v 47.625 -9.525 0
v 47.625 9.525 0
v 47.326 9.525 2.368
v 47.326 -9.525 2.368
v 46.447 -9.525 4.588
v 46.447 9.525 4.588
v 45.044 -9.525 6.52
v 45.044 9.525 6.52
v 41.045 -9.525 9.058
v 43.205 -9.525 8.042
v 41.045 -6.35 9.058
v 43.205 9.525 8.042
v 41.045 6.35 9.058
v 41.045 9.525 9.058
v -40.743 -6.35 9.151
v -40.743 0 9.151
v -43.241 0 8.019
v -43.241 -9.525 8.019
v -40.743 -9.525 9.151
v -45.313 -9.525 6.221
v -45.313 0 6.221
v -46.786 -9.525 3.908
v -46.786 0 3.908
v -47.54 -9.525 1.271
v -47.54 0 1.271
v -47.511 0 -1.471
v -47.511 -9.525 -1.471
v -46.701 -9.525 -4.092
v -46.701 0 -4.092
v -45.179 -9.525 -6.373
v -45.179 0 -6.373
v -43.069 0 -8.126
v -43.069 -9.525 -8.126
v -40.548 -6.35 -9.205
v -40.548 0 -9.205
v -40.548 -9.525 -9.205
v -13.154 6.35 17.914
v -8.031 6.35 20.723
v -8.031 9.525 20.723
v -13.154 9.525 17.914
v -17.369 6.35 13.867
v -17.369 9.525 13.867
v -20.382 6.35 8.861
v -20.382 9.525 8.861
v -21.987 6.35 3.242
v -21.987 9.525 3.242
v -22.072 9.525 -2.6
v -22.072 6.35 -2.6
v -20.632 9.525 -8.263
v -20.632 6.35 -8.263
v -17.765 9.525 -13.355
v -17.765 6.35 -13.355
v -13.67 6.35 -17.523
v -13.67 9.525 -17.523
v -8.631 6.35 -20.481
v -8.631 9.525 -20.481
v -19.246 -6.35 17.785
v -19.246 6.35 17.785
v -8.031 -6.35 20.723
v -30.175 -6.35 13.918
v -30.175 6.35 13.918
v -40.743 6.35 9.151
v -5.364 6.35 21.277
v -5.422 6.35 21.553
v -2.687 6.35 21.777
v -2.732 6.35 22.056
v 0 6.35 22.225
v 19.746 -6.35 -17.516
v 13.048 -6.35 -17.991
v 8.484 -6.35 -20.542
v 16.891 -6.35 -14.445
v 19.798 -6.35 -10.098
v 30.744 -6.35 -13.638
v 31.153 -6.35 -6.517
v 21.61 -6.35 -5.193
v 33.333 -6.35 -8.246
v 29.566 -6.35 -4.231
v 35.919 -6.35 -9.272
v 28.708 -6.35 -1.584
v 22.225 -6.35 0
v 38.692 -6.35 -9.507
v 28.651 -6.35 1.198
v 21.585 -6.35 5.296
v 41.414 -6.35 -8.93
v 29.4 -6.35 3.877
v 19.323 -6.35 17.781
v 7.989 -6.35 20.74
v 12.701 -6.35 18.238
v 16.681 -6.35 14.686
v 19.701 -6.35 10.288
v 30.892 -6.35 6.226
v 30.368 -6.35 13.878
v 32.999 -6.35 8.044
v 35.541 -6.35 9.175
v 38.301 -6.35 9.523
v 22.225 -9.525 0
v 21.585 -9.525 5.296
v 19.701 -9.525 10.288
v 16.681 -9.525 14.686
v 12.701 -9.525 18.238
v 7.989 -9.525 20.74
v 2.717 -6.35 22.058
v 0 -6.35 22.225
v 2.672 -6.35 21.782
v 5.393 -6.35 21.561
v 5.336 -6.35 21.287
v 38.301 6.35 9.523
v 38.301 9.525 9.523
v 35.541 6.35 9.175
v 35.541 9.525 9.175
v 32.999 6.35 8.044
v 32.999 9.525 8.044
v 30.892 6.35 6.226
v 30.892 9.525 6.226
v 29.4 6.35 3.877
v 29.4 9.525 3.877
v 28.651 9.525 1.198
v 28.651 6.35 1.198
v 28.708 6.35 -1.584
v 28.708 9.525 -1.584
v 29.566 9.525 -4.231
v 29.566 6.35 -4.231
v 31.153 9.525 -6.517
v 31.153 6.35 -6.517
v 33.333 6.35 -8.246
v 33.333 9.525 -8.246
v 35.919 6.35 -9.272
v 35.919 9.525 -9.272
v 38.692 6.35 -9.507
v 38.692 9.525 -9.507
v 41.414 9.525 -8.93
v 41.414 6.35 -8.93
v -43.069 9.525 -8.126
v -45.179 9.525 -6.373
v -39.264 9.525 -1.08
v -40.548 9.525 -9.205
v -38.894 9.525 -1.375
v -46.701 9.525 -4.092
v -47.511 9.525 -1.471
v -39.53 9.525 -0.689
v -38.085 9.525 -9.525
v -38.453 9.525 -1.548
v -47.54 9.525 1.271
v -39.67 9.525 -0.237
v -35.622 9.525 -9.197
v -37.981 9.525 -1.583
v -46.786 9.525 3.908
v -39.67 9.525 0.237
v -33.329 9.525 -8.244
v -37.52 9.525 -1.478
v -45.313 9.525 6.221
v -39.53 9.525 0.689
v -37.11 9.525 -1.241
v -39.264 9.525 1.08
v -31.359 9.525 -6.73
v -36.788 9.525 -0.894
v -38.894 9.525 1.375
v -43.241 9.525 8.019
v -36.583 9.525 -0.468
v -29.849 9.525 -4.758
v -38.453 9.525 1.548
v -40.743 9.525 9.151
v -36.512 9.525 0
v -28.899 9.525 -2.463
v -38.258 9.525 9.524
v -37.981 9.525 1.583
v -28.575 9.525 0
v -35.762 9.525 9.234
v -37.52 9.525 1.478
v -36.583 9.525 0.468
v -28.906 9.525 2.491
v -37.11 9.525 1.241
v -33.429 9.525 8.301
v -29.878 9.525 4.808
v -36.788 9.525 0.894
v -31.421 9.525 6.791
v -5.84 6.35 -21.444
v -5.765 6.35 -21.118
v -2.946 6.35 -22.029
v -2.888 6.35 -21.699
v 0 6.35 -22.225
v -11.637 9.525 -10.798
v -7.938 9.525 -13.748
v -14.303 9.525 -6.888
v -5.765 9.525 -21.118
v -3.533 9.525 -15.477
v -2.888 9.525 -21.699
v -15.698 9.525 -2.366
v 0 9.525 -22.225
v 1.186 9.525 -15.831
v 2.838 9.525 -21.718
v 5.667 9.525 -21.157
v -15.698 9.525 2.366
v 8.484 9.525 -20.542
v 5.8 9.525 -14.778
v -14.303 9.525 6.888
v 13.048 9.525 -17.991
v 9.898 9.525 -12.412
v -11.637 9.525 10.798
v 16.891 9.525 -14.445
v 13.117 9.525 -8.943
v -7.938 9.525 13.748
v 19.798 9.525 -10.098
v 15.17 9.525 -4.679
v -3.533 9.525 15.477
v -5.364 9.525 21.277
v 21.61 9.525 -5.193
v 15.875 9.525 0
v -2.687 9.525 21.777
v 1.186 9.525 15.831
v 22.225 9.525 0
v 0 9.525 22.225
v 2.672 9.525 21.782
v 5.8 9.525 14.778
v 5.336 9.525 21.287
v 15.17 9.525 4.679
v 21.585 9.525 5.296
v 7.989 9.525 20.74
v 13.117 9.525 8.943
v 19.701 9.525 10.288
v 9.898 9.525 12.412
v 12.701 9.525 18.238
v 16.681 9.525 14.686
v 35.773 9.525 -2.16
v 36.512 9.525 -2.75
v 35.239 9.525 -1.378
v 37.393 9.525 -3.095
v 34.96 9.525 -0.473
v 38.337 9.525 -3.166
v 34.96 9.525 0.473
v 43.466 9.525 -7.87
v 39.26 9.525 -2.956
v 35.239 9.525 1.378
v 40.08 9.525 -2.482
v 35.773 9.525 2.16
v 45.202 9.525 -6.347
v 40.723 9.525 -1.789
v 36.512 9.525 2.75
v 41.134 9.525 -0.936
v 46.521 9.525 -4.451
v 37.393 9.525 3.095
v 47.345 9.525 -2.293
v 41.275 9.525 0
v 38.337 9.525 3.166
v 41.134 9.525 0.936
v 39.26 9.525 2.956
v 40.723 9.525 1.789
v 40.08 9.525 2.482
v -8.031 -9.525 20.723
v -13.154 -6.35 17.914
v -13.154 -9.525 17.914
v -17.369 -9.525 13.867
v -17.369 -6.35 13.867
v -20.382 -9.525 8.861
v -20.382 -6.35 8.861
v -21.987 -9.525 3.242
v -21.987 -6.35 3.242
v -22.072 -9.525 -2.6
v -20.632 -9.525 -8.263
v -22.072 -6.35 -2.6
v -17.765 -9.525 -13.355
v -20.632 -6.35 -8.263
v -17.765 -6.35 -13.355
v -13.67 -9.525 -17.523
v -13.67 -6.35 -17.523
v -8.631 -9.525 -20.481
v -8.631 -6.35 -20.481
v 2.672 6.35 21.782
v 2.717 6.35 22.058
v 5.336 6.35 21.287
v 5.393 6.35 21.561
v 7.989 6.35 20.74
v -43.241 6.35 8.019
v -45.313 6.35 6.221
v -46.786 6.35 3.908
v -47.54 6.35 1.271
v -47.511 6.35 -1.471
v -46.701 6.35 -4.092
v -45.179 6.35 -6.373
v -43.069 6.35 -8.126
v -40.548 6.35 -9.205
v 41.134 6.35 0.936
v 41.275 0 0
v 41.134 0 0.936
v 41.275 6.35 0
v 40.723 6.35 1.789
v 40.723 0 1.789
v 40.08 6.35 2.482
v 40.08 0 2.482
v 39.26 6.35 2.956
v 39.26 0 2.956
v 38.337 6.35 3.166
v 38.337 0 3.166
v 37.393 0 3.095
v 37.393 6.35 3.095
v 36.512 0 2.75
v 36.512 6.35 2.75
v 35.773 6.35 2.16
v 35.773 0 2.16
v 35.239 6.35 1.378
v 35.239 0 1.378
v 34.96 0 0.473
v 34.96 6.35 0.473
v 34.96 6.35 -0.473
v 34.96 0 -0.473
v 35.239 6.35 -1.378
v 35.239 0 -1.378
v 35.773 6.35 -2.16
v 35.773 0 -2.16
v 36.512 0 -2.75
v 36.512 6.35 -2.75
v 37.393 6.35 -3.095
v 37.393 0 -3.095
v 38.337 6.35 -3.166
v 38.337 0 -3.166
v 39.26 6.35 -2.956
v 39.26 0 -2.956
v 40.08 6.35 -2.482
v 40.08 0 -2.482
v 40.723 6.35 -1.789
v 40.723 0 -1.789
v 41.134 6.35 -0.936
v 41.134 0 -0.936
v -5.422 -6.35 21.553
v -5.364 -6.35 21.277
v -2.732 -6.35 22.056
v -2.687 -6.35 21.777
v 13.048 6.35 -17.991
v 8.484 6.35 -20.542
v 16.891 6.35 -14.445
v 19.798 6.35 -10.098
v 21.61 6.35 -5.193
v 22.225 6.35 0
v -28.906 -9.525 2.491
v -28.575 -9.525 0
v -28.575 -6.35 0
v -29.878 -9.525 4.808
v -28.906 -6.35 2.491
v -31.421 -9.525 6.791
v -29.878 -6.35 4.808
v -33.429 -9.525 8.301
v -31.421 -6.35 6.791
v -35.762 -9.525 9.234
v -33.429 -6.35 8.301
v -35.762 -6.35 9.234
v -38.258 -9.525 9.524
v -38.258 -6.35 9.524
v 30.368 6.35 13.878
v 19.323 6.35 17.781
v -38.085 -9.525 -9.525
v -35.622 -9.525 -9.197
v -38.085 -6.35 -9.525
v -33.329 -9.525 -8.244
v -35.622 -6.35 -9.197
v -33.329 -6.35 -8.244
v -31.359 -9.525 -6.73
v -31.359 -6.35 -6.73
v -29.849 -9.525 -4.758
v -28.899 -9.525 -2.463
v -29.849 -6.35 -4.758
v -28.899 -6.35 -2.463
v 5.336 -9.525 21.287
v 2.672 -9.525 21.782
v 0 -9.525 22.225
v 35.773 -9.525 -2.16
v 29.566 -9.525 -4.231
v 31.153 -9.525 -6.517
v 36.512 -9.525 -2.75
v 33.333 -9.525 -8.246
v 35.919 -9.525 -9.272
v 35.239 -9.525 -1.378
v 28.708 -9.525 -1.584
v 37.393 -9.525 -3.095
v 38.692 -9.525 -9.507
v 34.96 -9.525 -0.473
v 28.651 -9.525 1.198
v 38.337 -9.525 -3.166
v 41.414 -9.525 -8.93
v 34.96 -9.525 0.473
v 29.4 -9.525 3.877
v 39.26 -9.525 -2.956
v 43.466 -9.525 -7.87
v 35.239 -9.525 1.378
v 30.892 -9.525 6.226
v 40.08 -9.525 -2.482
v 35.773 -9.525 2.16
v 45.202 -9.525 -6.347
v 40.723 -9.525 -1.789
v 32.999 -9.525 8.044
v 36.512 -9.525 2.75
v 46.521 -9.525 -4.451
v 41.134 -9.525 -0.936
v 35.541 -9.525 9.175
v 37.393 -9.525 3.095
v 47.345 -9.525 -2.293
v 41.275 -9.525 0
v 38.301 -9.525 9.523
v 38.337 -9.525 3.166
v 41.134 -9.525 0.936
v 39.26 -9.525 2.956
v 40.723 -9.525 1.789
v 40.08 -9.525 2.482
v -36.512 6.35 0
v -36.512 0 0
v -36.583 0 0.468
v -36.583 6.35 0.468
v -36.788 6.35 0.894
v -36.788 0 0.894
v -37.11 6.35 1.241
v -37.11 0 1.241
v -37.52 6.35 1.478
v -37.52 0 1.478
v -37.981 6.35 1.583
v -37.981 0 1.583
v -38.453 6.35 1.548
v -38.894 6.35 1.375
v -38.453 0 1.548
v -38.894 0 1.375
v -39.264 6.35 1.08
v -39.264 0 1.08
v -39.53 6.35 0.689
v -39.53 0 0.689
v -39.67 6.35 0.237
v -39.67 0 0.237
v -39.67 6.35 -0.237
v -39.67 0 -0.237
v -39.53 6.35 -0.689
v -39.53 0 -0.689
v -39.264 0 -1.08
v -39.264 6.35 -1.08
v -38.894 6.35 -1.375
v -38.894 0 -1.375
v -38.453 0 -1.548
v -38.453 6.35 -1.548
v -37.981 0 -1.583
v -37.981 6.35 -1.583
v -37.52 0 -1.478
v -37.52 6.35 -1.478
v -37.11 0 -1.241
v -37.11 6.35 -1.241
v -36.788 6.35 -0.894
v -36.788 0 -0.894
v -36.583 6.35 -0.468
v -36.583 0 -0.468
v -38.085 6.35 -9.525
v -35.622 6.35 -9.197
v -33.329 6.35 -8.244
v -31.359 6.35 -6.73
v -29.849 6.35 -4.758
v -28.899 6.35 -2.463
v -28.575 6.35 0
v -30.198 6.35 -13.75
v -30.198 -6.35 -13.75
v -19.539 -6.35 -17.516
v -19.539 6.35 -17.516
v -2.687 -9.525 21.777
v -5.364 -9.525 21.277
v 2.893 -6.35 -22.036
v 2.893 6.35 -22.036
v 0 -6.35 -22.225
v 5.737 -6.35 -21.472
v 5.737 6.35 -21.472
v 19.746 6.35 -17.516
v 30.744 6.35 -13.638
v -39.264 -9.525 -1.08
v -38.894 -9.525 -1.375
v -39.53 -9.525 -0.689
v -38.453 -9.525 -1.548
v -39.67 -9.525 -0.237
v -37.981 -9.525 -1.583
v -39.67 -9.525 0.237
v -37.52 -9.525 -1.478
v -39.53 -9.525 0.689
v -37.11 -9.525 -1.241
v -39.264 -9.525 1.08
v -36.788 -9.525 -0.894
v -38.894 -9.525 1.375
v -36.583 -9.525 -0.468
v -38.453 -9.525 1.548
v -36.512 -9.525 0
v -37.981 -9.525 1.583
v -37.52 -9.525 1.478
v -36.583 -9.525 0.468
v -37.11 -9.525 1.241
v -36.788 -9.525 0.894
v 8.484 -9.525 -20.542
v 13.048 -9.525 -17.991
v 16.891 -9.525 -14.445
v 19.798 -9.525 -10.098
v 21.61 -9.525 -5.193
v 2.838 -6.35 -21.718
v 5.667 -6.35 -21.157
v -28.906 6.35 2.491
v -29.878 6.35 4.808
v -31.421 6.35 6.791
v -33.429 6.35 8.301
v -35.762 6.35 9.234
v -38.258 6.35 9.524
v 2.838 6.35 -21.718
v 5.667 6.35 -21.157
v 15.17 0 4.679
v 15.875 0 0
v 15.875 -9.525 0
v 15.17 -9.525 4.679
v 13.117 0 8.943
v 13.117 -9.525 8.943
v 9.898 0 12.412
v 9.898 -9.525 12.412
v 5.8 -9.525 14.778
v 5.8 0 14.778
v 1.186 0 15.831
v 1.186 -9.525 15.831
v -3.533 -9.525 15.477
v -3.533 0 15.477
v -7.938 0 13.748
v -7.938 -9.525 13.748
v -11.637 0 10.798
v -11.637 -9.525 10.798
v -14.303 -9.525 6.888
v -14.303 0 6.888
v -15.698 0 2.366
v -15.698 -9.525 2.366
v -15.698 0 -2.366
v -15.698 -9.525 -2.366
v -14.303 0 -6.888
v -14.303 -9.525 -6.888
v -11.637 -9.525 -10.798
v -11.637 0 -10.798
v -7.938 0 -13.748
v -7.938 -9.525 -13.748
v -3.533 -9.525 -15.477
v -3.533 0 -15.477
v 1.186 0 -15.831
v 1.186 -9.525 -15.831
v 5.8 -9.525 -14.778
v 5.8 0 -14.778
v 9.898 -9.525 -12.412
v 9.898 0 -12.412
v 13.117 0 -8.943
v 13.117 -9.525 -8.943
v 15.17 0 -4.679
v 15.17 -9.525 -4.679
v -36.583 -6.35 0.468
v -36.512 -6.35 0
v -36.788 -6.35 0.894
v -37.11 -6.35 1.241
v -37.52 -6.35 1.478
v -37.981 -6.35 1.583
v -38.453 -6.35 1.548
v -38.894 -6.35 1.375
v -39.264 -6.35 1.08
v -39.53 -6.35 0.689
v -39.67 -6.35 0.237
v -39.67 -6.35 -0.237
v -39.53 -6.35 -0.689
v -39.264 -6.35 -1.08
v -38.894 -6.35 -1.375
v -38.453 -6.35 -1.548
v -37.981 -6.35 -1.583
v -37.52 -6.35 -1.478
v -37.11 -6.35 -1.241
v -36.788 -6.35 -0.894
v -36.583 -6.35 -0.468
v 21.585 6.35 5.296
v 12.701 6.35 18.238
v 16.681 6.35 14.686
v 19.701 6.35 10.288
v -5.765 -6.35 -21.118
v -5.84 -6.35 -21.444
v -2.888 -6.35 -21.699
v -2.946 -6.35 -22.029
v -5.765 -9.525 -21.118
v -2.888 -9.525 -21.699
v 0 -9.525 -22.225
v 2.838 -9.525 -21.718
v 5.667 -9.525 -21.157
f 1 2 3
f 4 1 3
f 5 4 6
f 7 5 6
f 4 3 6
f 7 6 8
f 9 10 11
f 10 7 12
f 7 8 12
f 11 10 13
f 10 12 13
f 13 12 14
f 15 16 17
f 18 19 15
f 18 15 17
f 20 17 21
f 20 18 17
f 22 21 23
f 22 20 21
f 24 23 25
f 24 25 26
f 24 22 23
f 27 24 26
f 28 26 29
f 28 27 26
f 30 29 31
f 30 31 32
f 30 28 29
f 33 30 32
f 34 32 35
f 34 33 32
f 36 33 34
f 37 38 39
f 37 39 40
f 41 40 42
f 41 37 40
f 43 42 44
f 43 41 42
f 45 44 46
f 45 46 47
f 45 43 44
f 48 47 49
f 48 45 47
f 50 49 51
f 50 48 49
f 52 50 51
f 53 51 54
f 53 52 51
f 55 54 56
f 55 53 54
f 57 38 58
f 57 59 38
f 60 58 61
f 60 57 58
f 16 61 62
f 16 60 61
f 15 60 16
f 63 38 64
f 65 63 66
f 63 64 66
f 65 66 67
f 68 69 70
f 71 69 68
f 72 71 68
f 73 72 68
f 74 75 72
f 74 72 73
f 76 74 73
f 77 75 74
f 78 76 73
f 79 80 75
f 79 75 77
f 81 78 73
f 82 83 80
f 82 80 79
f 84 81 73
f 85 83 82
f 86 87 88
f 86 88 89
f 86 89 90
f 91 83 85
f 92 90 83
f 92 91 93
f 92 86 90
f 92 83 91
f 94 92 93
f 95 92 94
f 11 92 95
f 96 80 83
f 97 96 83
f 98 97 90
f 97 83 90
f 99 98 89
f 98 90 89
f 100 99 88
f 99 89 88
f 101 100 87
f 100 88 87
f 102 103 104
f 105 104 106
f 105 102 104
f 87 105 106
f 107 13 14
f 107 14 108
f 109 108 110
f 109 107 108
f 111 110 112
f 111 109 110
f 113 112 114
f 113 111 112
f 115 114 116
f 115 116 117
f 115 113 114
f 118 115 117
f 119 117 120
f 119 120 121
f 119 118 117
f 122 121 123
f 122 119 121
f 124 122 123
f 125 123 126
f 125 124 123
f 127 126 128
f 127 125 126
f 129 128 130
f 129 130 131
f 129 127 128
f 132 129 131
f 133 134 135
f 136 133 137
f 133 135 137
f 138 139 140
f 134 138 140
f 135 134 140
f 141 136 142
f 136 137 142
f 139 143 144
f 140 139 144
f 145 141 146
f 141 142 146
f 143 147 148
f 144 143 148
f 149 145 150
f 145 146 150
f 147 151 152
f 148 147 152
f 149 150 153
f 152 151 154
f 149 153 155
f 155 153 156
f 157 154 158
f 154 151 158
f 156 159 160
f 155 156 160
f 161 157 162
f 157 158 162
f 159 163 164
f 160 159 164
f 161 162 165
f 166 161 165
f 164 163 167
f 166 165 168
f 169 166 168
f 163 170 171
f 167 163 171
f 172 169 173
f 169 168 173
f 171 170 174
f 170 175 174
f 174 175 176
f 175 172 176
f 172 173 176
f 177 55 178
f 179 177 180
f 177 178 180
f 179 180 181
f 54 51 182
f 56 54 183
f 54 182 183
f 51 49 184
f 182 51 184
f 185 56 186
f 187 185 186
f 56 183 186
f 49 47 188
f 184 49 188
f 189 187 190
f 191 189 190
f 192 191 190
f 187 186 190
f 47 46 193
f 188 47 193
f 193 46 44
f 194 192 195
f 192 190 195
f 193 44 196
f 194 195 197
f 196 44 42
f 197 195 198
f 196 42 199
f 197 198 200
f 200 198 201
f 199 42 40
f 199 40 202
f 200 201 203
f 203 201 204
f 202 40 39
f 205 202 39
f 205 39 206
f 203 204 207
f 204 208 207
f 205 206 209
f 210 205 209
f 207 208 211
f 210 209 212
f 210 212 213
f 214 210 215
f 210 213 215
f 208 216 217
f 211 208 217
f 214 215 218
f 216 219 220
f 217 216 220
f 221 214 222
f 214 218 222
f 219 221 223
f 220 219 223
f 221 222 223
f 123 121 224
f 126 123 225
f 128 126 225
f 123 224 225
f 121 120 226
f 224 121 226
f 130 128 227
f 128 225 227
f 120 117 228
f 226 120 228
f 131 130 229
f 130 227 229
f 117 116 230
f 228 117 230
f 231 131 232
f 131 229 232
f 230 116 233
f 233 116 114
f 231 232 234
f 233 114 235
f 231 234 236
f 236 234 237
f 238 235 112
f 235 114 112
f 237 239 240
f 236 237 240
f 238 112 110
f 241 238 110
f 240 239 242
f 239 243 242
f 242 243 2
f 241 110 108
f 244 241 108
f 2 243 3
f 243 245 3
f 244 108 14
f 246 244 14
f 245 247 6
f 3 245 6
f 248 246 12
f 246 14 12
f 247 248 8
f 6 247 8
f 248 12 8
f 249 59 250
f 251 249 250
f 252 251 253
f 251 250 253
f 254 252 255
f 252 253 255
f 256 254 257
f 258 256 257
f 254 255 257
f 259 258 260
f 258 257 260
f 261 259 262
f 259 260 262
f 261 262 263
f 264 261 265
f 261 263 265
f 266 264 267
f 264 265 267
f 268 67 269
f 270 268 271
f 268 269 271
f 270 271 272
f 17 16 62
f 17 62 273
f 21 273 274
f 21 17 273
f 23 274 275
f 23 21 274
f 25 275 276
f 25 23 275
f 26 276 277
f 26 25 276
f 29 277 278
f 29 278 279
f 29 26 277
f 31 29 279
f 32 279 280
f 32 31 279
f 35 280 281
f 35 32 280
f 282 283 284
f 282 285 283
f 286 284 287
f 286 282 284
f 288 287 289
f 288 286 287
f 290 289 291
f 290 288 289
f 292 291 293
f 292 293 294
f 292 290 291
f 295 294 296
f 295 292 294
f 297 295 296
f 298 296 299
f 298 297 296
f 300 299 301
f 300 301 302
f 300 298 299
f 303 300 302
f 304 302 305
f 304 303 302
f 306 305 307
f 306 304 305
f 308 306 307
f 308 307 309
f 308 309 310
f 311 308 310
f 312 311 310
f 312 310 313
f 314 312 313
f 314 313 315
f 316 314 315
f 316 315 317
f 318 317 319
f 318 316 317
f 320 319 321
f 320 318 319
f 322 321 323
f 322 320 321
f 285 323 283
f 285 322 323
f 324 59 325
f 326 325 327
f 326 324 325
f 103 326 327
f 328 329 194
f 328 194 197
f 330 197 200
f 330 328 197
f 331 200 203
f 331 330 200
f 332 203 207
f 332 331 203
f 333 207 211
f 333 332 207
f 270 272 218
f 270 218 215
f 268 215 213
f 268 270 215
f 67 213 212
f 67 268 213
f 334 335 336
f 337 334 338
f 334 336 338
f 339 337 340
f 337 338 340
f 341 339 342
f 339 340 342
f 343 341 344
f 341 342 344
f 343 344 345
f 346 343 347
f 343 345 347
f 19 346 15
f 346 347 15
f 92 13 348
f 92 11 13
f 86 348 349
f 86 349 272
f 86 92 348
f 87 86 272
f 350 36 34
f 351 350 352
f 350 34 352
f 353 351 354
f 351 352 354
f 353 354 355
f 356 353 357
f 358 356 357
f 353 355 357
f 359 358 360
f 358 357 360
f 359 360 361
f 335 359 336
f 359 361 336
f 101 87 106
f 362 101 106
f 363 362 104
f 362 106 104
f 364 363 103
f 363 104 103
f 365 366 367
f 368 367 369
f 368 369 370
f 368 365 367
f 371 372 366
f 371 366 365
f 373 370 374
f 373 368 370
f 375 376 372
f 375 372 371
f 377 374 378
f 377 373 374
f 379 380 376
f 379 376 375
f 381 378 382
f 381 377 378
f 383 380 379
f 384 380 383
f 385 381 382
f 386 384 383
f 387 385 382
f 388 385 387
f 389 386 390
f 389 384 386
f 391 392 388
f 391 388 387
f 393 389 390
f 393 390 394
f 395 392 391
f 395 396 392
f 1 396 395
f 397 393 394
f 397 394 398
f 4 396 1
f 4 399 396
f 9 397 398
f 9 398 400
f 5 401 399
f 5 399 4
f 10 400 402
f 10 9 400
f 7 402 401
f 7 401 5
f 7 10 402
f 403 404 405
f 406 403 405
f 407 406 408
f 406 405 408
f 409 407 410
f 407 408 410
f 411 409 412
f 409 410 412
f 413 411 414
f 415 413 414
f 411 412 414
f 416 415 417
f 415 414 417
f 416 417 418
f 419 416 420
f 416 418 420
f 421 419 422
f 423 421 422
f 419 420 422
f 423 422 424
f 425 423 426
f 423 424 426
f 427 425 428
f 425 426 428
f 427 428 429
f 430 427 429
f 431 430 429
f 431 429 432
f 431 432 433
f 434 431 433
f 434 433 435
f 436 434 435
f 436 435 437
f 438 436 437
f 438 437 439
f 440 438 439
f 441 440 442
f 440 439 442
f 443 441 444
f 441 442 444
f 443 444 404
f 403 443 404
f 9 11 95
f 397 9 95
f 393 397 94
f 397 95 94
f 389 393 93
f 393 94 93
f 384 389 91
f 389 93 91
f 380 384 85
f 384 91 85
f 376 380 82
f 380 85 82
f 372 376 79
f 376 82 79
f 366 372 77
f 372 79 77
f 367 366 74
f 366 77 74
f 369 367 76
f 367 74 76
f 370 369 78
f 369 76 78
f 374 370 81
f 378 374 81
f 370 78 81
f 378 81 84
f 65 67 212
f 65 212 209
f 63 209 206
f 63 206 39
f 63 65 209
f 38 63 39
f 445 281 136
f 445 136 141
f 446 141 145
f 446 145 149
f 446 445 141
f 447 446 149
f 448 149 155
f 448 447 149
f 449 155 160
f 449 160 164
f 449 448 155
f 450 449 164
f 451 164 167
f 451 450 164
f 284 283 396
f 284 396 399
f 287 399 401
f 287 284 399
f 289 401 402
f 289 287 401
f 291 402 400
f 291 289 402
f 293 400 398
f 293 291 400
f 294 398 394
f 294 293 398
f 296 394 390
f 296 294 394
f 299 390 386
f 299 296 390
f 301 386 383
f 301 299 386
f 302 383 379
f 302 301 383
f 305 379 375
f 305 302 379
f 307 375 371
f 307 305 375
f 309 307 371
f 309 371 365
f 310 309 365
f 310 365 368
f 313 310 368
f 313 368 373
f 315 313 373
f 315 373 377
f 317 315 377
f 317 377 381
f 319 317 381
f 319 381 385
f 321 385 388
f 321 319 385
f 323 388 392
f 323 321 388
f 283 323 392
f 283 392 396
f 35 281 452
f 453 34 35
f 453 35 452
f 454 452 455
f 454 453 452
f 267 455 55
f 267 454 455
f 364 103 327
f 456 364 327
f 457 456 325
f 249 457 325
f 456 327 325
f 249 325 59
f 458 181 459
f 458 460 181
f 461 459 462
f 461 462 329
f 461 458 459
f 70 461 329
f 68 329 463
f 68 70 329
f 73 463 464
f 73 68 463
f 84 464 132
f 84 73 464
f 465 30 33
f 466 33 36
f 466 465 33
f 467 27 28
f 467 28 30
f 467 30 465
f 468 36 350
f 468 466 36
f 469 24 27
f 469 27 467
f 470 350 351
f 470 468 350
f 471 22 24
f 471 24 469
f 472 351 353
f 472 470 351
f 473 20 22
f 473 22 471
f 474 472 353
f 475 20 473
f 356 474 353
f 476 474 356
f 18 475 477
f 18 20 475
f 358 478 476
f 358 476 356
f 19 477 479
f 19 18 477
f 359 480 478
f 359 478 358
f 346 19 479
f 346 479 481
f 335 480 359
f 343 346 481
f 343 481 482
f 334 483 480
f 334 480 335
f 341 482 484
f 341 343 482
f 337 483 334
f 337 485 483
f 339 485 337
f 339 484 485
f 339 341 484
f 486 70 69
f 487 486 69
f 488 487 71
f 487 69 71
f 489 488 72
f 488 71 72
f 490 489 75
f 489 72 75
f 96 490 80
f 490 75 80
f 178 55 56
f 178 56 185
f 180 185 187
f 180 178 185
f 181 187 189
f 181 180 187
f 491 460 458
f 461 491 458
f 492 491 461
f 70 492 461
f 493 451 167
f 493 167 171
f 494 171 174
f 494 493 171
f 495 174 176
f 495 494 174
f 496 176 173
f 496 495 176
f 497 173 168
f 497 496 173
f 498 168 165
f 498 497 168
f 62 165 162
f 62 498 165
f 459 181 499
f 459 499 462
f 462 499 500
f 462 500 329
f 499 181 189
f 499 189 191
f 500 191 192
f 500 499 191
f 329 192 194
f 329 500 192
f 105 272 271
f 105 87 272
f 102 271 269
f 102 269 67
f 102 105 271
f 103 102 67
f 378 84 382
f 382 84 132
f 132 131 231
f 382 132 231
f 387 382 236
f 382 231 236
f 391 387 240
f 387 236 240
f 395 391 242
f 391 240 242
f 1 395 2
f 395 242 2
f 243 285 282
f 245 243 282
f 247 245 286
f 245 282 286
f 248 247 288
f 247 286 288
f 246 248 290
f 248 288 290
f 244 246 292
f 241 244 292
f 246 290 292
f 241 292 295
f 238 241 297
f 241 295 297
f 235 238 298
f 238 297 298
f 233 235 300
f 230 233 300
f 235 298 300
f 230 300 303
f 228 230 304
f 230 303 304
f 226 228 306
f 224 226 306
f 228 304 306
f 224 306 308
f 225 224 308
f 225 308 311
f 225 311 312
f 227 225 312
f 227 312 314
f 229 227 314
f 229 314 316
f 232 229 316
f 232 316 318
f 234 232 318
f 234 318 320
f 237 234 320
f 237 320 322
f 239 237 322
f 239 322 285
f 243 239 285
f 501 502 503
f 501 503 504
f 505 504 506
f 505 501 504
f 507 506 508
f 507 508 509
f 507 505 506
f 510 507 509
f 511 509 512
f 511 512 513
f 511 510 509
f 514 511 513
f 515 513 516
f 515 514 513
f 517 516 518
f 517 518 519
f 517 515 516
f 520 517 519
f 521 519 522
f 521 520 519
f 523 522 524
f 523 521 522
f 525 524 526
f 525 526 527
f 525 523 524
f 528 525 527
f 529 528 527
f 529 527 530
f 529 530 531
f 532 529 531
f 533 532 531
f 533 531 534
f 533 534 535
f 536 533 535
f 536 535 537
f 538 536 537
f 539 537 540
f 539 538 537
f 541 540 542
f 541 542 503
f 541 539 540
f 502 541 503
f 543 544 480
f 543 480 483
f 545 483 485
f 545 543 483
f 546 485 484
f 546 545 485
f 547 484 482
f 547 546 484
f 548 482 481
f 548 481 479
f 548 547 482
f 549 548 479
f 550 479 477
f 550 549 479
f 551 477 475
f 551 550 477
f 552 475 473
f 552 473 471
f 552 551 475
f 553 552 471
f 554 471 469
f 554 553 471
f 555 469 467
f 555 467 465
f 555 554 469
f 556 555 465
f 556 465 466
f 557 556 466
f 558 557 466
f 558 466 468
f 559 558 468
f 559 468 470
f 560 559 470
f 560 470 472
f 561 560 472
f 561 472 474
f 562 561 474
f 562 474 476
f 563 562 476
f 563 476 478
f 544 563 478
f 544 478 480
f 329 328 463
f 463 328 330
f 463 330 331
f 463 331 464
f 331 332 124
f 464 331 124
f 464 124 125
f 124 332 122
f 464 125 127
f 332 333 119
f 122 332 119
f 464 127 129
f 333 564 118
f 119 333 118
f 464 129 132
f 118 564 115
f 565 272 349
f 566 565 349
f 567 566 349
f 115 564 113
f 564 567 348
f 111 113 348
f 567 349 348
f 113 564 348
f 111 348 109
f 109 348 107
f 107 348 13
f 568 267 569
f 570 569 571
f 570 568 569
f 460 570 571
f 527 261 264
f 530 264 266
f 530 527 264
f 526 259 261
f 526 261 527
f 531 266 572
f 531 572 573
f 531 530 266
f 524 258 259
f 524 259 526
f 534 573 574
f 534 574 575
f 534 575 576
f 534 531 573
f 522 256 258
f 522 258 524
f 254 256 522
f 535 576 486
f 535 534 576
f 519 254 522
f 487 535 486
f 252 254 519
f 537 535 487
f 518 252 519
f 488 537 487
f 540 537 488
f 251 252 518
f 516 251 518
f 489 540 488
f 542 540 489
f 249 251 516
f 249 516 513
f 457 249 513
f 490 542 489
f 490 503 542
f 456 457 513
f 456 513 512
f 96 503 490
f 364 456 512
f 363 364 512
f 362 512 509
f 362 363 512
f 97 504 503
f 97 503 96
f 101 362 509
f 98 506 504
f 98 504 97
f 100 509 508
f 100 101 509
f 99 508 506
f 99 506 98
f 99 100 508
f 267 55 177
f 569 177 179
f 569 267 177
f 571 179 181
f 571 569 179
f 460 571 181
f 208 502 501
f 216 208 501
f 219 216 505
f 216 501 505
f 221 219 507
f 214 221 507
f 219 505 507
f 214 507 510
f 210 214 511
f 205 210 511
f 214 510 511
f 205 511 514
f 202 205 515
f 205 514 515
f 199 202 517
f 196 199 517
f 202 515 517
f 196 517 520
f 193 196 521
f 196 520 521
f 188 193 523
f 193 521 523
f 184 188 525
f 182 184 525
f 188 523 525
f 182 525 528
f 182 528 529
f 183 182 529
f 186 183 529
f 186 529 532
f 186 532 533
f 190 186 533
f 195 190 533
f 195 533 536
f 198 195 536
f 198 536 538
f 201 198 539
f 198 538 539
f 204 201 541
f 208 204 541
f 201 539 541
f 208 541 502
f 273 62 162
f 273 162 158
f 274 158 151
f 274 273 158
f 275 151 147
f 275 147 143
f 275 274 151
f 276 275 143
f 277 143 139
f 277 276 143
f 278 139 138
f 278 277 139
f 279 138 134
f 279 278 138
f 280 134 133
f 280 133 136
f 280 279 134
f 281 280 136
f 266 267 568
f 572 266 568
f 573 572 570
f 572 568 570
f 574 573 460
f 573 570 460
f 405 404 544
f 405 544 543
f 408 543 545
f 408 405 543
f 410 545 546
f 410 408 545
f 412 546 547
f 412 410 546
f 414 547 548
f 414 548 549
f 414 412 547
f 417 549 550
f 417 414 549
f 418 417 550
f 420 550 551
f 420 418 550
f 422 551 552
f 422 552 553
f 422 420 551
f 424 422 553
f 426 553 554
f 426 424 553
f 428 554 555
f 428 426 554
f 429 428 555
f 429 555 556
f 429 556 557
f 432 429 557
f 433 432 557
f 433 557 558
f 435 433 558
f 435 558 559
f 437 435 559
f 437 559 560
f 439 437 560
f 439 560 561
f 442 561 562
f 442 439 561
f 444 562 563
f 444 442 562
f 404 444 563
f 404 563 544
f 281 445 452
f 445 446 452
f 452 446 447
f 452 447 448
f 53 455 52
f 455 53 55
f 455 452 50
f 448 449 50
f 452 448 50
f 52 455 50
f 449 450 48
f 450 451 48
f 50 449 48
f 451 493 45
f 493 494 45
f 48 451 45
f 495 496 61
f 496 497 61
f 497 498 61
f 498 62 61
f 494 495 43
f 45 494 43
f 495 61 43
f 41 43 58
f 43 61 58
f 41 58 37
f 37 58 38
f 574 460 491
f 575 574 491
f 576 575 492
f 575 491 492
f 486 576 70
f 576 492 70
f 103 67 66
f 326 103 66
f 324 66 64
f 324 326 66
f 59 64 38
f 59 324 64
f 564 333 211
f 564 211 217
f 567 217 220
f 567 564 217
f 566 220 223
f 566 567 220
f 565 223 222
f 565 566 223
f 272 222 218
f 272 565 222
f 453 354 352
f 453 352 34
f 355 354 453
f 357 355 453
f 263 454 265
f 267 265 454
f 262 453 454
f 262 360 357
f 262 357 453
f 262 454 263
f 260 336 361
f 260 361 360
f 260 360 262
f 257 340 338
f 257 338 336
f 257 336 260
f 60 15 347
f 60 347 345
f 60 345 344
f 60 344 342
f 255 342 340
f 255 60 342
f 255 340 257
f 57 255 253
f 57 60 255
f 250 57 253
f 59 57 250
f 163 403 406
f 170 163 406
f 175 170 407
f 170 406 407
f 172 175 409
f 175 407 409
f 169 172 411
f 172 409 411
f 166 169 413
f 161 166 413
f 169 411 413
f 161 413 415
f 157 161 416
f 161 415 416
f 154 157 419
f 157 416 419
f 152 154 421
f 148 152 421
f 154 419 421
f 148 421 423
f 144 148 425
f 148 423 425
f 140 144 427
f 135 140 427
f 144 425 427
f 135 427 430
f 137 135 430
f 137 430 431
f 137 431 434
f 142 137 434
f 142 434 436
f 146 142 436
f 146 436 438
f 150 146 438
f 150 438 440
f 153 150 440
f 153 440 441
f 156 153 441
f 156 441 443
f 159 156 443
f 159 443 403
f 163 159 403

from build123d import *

# Parameters (mm, degrees)
F0_R          = 3.175
F0_R_2        = 1.5875
F1_DEPTH      = 6.35
F1_DEPTH_BACK = 6.35
F0_R_3        = 15.875
F2_DEPTH      = 9.525
F2_DEPTH_BACK = 9.525


with BuildPart() as f1:
    # F0 (on Front) → F1 (new body, two sides)
    with BuildSketch(Plane.XZ) as f1_sk:
        with BuildLine():
            ThreePointArc((7.988833, 20.739556), (18.323515, 12.577734), (22.225, 0))
            ThreePointArc((22.225, 0), (18.472933, -12.357239), (8.483595, -20.542133))
            ThreePointArc((8.483595, -20.542133), (25.28233, -15.682289), (41.413731, -8.929995))
            ThreePointArc((41.413731, -8.929995), (28.577003, -0.195336), (41.044752, 9.05837))
            ThreePointArc((41.044752, 9.05837), (24.886927, 15.946385), (7.988833, 20.739556))
        make_face()
        with BuildLine():
            ThreePointArc((0, 22.225), (4.005284, 21.540726), (7.988833, 20.739556))
            ThreePointArc((7.988833, 20.739556), (4.062881, 21.850483), (0, 22.225))
        make_face()
        with BuildLine():
            ThreePointArc((0, -22.225), (4.324449, -21.800224), (8.483595, -20.542133))
            ThreePointArc((8.483595, -20.542133), (4.253738, -21.443761), (0, -22.225))
        make_face()
        with BuildLine():
            ThreePointArc((-8.030667, 20.723393), (-4.026414, 21.533454), (0, 22.225))
            ThreePointArc((0, 22.225), (-4.084925, 21.846373), (-8.030667, 20.723393))
        make_face()
        with BuildLine():
            ThreePointArc((47.625, 0), (45.806309, 5.598074), (41.044752, 9.05837))
            ThreePointArc((41.044752, 9.05837), (28.577003, -0.195336), (41.413731, -8.929995))
            ThreePointArc((41.413731, -8.929995), (45.919492, -5.438857), (47.625, 0))
        make_face()
        with Locations((38.1, 0)):
            Circle(F0_R, mode=Mode.SUBTRACT)
        with BuildLine():
            ThreePointArc((-8.630772, -20.480732), (-4.402633, -21.784569), (0, -22.225))
            ThreePointArc((0, -22.225), (-4.327986, -21.415212), (-8.630772, -20.480732))
        make_face()
        with BuildLine():
            ThreePointArc((-8.630772, -20.480732), (-22.222643, 0.323655), (-8.030667, 20.723393))
            ThreePointArc((-8.030667, 20.723393), (-24.750865, 15.966198), (-40.743005, 9.150964))
            ThreePointArc((-40.743005, 9.150964), (-32.375011, 7.612498), (-28.575, 0))
            ThreePointArc((-28.575, 0), (-32.294478, -7.551261), (-40.548027, -9.205042))
            ThreePointArc((-40.548027, -9.205042), (-24.903434, -15.731802), (-8.630772, -20.480732))
        make_face()
        with BuildLine():
            ThreePointArc((-28.575, 0), (-32.375011, 7.612498), (-40.743005, 9.150964))
            ThreePointArc((-40.743005, 9.150964), (-47.624463, -0.101169), (-40.548027, -9.205042))
            ThreePointArc((-40.548027, -9.205042), (-32.294478, -7.551261), (-28.575, 0))
        make_face()
        with Locations((-38.1, 0)):
            Circle(F0_R_2, mode=Mode.SUBTRACT)
    extrude(amount=F1_DEPTH)
    extrude(f1_sk.sketch, amount=-F1_DEPTH_BACK)

    # F0 (on Front) → F2 (join, two sides)
    with BuildSketch(Plane.XZ) as f2_sk:
        with BuildLine():
            ThreePointArc((47.625, 0), (45.806309, 5.598074), (41.044752, 9.05837))
            ThreePointArc((41.044752, 9.05837), (28.577003, -0.195336), (41.413731, -8.929995))
            ThreePointArc((41.413731, -8.929995), (45.919492, -5.438857), (47.625, 0))
        make_face()
        with Locations((38.1, 0)):
            Circle(F0_R, mode=Mode.SUBTRACT)
        with BuildLine():
            ThreePointArc((-28.575, 0), (-32.375011, 7.612498), (-40.743005, 9.150964))
            ThreePointArc((-40.743005, 9.150964), (-47.624463, -0.101169), (-40.548027, -9.205042))
            ThreePointArc((-40.548027, -9.205042), (-32.294478, -7.551261), (-28.575, 0))
        make_face()
        with Locations((-38.1, 0)):
            Circle(F0_R_2, mode=Mode.SUBTRACT)
        with BuildLine():
            ThreePointArc((8.483595, -20.542133), (18.472933, -12.357239), (22.225, 0))
            ThreePointArc((22.225, 0), (18.323515, 12.577734), (7.988833, 20.739556))
            ThreePointArc((7.988833, 20.739556), (4.005284, 21.540726), (0, 22.225))
            ThreePointArc((0, 22.225), (-4.026414, 21.533454), (-8.030667, 20.723393))
            ThreePointArc((-8.030667, 20.723393), (-22.222643, 0.323655), (-8.630772, -20.480732))
            ThreePointArc((-8.630772, -20.480732), (-4.327986, -21.415212), (0, -22.225))
            ThreePointArc((0, -22.225), (4.253738, -21.443761), (8.483595, -20.542133))
        make_face()
        Circle(F0_R_3, mode=Mode.SUBTRACT)
    extrude(amount=F2_DEPTH)
    extrude(f2_sk.sketch, amount=-F2_DEPTH_BACK)


solid = f1.part
